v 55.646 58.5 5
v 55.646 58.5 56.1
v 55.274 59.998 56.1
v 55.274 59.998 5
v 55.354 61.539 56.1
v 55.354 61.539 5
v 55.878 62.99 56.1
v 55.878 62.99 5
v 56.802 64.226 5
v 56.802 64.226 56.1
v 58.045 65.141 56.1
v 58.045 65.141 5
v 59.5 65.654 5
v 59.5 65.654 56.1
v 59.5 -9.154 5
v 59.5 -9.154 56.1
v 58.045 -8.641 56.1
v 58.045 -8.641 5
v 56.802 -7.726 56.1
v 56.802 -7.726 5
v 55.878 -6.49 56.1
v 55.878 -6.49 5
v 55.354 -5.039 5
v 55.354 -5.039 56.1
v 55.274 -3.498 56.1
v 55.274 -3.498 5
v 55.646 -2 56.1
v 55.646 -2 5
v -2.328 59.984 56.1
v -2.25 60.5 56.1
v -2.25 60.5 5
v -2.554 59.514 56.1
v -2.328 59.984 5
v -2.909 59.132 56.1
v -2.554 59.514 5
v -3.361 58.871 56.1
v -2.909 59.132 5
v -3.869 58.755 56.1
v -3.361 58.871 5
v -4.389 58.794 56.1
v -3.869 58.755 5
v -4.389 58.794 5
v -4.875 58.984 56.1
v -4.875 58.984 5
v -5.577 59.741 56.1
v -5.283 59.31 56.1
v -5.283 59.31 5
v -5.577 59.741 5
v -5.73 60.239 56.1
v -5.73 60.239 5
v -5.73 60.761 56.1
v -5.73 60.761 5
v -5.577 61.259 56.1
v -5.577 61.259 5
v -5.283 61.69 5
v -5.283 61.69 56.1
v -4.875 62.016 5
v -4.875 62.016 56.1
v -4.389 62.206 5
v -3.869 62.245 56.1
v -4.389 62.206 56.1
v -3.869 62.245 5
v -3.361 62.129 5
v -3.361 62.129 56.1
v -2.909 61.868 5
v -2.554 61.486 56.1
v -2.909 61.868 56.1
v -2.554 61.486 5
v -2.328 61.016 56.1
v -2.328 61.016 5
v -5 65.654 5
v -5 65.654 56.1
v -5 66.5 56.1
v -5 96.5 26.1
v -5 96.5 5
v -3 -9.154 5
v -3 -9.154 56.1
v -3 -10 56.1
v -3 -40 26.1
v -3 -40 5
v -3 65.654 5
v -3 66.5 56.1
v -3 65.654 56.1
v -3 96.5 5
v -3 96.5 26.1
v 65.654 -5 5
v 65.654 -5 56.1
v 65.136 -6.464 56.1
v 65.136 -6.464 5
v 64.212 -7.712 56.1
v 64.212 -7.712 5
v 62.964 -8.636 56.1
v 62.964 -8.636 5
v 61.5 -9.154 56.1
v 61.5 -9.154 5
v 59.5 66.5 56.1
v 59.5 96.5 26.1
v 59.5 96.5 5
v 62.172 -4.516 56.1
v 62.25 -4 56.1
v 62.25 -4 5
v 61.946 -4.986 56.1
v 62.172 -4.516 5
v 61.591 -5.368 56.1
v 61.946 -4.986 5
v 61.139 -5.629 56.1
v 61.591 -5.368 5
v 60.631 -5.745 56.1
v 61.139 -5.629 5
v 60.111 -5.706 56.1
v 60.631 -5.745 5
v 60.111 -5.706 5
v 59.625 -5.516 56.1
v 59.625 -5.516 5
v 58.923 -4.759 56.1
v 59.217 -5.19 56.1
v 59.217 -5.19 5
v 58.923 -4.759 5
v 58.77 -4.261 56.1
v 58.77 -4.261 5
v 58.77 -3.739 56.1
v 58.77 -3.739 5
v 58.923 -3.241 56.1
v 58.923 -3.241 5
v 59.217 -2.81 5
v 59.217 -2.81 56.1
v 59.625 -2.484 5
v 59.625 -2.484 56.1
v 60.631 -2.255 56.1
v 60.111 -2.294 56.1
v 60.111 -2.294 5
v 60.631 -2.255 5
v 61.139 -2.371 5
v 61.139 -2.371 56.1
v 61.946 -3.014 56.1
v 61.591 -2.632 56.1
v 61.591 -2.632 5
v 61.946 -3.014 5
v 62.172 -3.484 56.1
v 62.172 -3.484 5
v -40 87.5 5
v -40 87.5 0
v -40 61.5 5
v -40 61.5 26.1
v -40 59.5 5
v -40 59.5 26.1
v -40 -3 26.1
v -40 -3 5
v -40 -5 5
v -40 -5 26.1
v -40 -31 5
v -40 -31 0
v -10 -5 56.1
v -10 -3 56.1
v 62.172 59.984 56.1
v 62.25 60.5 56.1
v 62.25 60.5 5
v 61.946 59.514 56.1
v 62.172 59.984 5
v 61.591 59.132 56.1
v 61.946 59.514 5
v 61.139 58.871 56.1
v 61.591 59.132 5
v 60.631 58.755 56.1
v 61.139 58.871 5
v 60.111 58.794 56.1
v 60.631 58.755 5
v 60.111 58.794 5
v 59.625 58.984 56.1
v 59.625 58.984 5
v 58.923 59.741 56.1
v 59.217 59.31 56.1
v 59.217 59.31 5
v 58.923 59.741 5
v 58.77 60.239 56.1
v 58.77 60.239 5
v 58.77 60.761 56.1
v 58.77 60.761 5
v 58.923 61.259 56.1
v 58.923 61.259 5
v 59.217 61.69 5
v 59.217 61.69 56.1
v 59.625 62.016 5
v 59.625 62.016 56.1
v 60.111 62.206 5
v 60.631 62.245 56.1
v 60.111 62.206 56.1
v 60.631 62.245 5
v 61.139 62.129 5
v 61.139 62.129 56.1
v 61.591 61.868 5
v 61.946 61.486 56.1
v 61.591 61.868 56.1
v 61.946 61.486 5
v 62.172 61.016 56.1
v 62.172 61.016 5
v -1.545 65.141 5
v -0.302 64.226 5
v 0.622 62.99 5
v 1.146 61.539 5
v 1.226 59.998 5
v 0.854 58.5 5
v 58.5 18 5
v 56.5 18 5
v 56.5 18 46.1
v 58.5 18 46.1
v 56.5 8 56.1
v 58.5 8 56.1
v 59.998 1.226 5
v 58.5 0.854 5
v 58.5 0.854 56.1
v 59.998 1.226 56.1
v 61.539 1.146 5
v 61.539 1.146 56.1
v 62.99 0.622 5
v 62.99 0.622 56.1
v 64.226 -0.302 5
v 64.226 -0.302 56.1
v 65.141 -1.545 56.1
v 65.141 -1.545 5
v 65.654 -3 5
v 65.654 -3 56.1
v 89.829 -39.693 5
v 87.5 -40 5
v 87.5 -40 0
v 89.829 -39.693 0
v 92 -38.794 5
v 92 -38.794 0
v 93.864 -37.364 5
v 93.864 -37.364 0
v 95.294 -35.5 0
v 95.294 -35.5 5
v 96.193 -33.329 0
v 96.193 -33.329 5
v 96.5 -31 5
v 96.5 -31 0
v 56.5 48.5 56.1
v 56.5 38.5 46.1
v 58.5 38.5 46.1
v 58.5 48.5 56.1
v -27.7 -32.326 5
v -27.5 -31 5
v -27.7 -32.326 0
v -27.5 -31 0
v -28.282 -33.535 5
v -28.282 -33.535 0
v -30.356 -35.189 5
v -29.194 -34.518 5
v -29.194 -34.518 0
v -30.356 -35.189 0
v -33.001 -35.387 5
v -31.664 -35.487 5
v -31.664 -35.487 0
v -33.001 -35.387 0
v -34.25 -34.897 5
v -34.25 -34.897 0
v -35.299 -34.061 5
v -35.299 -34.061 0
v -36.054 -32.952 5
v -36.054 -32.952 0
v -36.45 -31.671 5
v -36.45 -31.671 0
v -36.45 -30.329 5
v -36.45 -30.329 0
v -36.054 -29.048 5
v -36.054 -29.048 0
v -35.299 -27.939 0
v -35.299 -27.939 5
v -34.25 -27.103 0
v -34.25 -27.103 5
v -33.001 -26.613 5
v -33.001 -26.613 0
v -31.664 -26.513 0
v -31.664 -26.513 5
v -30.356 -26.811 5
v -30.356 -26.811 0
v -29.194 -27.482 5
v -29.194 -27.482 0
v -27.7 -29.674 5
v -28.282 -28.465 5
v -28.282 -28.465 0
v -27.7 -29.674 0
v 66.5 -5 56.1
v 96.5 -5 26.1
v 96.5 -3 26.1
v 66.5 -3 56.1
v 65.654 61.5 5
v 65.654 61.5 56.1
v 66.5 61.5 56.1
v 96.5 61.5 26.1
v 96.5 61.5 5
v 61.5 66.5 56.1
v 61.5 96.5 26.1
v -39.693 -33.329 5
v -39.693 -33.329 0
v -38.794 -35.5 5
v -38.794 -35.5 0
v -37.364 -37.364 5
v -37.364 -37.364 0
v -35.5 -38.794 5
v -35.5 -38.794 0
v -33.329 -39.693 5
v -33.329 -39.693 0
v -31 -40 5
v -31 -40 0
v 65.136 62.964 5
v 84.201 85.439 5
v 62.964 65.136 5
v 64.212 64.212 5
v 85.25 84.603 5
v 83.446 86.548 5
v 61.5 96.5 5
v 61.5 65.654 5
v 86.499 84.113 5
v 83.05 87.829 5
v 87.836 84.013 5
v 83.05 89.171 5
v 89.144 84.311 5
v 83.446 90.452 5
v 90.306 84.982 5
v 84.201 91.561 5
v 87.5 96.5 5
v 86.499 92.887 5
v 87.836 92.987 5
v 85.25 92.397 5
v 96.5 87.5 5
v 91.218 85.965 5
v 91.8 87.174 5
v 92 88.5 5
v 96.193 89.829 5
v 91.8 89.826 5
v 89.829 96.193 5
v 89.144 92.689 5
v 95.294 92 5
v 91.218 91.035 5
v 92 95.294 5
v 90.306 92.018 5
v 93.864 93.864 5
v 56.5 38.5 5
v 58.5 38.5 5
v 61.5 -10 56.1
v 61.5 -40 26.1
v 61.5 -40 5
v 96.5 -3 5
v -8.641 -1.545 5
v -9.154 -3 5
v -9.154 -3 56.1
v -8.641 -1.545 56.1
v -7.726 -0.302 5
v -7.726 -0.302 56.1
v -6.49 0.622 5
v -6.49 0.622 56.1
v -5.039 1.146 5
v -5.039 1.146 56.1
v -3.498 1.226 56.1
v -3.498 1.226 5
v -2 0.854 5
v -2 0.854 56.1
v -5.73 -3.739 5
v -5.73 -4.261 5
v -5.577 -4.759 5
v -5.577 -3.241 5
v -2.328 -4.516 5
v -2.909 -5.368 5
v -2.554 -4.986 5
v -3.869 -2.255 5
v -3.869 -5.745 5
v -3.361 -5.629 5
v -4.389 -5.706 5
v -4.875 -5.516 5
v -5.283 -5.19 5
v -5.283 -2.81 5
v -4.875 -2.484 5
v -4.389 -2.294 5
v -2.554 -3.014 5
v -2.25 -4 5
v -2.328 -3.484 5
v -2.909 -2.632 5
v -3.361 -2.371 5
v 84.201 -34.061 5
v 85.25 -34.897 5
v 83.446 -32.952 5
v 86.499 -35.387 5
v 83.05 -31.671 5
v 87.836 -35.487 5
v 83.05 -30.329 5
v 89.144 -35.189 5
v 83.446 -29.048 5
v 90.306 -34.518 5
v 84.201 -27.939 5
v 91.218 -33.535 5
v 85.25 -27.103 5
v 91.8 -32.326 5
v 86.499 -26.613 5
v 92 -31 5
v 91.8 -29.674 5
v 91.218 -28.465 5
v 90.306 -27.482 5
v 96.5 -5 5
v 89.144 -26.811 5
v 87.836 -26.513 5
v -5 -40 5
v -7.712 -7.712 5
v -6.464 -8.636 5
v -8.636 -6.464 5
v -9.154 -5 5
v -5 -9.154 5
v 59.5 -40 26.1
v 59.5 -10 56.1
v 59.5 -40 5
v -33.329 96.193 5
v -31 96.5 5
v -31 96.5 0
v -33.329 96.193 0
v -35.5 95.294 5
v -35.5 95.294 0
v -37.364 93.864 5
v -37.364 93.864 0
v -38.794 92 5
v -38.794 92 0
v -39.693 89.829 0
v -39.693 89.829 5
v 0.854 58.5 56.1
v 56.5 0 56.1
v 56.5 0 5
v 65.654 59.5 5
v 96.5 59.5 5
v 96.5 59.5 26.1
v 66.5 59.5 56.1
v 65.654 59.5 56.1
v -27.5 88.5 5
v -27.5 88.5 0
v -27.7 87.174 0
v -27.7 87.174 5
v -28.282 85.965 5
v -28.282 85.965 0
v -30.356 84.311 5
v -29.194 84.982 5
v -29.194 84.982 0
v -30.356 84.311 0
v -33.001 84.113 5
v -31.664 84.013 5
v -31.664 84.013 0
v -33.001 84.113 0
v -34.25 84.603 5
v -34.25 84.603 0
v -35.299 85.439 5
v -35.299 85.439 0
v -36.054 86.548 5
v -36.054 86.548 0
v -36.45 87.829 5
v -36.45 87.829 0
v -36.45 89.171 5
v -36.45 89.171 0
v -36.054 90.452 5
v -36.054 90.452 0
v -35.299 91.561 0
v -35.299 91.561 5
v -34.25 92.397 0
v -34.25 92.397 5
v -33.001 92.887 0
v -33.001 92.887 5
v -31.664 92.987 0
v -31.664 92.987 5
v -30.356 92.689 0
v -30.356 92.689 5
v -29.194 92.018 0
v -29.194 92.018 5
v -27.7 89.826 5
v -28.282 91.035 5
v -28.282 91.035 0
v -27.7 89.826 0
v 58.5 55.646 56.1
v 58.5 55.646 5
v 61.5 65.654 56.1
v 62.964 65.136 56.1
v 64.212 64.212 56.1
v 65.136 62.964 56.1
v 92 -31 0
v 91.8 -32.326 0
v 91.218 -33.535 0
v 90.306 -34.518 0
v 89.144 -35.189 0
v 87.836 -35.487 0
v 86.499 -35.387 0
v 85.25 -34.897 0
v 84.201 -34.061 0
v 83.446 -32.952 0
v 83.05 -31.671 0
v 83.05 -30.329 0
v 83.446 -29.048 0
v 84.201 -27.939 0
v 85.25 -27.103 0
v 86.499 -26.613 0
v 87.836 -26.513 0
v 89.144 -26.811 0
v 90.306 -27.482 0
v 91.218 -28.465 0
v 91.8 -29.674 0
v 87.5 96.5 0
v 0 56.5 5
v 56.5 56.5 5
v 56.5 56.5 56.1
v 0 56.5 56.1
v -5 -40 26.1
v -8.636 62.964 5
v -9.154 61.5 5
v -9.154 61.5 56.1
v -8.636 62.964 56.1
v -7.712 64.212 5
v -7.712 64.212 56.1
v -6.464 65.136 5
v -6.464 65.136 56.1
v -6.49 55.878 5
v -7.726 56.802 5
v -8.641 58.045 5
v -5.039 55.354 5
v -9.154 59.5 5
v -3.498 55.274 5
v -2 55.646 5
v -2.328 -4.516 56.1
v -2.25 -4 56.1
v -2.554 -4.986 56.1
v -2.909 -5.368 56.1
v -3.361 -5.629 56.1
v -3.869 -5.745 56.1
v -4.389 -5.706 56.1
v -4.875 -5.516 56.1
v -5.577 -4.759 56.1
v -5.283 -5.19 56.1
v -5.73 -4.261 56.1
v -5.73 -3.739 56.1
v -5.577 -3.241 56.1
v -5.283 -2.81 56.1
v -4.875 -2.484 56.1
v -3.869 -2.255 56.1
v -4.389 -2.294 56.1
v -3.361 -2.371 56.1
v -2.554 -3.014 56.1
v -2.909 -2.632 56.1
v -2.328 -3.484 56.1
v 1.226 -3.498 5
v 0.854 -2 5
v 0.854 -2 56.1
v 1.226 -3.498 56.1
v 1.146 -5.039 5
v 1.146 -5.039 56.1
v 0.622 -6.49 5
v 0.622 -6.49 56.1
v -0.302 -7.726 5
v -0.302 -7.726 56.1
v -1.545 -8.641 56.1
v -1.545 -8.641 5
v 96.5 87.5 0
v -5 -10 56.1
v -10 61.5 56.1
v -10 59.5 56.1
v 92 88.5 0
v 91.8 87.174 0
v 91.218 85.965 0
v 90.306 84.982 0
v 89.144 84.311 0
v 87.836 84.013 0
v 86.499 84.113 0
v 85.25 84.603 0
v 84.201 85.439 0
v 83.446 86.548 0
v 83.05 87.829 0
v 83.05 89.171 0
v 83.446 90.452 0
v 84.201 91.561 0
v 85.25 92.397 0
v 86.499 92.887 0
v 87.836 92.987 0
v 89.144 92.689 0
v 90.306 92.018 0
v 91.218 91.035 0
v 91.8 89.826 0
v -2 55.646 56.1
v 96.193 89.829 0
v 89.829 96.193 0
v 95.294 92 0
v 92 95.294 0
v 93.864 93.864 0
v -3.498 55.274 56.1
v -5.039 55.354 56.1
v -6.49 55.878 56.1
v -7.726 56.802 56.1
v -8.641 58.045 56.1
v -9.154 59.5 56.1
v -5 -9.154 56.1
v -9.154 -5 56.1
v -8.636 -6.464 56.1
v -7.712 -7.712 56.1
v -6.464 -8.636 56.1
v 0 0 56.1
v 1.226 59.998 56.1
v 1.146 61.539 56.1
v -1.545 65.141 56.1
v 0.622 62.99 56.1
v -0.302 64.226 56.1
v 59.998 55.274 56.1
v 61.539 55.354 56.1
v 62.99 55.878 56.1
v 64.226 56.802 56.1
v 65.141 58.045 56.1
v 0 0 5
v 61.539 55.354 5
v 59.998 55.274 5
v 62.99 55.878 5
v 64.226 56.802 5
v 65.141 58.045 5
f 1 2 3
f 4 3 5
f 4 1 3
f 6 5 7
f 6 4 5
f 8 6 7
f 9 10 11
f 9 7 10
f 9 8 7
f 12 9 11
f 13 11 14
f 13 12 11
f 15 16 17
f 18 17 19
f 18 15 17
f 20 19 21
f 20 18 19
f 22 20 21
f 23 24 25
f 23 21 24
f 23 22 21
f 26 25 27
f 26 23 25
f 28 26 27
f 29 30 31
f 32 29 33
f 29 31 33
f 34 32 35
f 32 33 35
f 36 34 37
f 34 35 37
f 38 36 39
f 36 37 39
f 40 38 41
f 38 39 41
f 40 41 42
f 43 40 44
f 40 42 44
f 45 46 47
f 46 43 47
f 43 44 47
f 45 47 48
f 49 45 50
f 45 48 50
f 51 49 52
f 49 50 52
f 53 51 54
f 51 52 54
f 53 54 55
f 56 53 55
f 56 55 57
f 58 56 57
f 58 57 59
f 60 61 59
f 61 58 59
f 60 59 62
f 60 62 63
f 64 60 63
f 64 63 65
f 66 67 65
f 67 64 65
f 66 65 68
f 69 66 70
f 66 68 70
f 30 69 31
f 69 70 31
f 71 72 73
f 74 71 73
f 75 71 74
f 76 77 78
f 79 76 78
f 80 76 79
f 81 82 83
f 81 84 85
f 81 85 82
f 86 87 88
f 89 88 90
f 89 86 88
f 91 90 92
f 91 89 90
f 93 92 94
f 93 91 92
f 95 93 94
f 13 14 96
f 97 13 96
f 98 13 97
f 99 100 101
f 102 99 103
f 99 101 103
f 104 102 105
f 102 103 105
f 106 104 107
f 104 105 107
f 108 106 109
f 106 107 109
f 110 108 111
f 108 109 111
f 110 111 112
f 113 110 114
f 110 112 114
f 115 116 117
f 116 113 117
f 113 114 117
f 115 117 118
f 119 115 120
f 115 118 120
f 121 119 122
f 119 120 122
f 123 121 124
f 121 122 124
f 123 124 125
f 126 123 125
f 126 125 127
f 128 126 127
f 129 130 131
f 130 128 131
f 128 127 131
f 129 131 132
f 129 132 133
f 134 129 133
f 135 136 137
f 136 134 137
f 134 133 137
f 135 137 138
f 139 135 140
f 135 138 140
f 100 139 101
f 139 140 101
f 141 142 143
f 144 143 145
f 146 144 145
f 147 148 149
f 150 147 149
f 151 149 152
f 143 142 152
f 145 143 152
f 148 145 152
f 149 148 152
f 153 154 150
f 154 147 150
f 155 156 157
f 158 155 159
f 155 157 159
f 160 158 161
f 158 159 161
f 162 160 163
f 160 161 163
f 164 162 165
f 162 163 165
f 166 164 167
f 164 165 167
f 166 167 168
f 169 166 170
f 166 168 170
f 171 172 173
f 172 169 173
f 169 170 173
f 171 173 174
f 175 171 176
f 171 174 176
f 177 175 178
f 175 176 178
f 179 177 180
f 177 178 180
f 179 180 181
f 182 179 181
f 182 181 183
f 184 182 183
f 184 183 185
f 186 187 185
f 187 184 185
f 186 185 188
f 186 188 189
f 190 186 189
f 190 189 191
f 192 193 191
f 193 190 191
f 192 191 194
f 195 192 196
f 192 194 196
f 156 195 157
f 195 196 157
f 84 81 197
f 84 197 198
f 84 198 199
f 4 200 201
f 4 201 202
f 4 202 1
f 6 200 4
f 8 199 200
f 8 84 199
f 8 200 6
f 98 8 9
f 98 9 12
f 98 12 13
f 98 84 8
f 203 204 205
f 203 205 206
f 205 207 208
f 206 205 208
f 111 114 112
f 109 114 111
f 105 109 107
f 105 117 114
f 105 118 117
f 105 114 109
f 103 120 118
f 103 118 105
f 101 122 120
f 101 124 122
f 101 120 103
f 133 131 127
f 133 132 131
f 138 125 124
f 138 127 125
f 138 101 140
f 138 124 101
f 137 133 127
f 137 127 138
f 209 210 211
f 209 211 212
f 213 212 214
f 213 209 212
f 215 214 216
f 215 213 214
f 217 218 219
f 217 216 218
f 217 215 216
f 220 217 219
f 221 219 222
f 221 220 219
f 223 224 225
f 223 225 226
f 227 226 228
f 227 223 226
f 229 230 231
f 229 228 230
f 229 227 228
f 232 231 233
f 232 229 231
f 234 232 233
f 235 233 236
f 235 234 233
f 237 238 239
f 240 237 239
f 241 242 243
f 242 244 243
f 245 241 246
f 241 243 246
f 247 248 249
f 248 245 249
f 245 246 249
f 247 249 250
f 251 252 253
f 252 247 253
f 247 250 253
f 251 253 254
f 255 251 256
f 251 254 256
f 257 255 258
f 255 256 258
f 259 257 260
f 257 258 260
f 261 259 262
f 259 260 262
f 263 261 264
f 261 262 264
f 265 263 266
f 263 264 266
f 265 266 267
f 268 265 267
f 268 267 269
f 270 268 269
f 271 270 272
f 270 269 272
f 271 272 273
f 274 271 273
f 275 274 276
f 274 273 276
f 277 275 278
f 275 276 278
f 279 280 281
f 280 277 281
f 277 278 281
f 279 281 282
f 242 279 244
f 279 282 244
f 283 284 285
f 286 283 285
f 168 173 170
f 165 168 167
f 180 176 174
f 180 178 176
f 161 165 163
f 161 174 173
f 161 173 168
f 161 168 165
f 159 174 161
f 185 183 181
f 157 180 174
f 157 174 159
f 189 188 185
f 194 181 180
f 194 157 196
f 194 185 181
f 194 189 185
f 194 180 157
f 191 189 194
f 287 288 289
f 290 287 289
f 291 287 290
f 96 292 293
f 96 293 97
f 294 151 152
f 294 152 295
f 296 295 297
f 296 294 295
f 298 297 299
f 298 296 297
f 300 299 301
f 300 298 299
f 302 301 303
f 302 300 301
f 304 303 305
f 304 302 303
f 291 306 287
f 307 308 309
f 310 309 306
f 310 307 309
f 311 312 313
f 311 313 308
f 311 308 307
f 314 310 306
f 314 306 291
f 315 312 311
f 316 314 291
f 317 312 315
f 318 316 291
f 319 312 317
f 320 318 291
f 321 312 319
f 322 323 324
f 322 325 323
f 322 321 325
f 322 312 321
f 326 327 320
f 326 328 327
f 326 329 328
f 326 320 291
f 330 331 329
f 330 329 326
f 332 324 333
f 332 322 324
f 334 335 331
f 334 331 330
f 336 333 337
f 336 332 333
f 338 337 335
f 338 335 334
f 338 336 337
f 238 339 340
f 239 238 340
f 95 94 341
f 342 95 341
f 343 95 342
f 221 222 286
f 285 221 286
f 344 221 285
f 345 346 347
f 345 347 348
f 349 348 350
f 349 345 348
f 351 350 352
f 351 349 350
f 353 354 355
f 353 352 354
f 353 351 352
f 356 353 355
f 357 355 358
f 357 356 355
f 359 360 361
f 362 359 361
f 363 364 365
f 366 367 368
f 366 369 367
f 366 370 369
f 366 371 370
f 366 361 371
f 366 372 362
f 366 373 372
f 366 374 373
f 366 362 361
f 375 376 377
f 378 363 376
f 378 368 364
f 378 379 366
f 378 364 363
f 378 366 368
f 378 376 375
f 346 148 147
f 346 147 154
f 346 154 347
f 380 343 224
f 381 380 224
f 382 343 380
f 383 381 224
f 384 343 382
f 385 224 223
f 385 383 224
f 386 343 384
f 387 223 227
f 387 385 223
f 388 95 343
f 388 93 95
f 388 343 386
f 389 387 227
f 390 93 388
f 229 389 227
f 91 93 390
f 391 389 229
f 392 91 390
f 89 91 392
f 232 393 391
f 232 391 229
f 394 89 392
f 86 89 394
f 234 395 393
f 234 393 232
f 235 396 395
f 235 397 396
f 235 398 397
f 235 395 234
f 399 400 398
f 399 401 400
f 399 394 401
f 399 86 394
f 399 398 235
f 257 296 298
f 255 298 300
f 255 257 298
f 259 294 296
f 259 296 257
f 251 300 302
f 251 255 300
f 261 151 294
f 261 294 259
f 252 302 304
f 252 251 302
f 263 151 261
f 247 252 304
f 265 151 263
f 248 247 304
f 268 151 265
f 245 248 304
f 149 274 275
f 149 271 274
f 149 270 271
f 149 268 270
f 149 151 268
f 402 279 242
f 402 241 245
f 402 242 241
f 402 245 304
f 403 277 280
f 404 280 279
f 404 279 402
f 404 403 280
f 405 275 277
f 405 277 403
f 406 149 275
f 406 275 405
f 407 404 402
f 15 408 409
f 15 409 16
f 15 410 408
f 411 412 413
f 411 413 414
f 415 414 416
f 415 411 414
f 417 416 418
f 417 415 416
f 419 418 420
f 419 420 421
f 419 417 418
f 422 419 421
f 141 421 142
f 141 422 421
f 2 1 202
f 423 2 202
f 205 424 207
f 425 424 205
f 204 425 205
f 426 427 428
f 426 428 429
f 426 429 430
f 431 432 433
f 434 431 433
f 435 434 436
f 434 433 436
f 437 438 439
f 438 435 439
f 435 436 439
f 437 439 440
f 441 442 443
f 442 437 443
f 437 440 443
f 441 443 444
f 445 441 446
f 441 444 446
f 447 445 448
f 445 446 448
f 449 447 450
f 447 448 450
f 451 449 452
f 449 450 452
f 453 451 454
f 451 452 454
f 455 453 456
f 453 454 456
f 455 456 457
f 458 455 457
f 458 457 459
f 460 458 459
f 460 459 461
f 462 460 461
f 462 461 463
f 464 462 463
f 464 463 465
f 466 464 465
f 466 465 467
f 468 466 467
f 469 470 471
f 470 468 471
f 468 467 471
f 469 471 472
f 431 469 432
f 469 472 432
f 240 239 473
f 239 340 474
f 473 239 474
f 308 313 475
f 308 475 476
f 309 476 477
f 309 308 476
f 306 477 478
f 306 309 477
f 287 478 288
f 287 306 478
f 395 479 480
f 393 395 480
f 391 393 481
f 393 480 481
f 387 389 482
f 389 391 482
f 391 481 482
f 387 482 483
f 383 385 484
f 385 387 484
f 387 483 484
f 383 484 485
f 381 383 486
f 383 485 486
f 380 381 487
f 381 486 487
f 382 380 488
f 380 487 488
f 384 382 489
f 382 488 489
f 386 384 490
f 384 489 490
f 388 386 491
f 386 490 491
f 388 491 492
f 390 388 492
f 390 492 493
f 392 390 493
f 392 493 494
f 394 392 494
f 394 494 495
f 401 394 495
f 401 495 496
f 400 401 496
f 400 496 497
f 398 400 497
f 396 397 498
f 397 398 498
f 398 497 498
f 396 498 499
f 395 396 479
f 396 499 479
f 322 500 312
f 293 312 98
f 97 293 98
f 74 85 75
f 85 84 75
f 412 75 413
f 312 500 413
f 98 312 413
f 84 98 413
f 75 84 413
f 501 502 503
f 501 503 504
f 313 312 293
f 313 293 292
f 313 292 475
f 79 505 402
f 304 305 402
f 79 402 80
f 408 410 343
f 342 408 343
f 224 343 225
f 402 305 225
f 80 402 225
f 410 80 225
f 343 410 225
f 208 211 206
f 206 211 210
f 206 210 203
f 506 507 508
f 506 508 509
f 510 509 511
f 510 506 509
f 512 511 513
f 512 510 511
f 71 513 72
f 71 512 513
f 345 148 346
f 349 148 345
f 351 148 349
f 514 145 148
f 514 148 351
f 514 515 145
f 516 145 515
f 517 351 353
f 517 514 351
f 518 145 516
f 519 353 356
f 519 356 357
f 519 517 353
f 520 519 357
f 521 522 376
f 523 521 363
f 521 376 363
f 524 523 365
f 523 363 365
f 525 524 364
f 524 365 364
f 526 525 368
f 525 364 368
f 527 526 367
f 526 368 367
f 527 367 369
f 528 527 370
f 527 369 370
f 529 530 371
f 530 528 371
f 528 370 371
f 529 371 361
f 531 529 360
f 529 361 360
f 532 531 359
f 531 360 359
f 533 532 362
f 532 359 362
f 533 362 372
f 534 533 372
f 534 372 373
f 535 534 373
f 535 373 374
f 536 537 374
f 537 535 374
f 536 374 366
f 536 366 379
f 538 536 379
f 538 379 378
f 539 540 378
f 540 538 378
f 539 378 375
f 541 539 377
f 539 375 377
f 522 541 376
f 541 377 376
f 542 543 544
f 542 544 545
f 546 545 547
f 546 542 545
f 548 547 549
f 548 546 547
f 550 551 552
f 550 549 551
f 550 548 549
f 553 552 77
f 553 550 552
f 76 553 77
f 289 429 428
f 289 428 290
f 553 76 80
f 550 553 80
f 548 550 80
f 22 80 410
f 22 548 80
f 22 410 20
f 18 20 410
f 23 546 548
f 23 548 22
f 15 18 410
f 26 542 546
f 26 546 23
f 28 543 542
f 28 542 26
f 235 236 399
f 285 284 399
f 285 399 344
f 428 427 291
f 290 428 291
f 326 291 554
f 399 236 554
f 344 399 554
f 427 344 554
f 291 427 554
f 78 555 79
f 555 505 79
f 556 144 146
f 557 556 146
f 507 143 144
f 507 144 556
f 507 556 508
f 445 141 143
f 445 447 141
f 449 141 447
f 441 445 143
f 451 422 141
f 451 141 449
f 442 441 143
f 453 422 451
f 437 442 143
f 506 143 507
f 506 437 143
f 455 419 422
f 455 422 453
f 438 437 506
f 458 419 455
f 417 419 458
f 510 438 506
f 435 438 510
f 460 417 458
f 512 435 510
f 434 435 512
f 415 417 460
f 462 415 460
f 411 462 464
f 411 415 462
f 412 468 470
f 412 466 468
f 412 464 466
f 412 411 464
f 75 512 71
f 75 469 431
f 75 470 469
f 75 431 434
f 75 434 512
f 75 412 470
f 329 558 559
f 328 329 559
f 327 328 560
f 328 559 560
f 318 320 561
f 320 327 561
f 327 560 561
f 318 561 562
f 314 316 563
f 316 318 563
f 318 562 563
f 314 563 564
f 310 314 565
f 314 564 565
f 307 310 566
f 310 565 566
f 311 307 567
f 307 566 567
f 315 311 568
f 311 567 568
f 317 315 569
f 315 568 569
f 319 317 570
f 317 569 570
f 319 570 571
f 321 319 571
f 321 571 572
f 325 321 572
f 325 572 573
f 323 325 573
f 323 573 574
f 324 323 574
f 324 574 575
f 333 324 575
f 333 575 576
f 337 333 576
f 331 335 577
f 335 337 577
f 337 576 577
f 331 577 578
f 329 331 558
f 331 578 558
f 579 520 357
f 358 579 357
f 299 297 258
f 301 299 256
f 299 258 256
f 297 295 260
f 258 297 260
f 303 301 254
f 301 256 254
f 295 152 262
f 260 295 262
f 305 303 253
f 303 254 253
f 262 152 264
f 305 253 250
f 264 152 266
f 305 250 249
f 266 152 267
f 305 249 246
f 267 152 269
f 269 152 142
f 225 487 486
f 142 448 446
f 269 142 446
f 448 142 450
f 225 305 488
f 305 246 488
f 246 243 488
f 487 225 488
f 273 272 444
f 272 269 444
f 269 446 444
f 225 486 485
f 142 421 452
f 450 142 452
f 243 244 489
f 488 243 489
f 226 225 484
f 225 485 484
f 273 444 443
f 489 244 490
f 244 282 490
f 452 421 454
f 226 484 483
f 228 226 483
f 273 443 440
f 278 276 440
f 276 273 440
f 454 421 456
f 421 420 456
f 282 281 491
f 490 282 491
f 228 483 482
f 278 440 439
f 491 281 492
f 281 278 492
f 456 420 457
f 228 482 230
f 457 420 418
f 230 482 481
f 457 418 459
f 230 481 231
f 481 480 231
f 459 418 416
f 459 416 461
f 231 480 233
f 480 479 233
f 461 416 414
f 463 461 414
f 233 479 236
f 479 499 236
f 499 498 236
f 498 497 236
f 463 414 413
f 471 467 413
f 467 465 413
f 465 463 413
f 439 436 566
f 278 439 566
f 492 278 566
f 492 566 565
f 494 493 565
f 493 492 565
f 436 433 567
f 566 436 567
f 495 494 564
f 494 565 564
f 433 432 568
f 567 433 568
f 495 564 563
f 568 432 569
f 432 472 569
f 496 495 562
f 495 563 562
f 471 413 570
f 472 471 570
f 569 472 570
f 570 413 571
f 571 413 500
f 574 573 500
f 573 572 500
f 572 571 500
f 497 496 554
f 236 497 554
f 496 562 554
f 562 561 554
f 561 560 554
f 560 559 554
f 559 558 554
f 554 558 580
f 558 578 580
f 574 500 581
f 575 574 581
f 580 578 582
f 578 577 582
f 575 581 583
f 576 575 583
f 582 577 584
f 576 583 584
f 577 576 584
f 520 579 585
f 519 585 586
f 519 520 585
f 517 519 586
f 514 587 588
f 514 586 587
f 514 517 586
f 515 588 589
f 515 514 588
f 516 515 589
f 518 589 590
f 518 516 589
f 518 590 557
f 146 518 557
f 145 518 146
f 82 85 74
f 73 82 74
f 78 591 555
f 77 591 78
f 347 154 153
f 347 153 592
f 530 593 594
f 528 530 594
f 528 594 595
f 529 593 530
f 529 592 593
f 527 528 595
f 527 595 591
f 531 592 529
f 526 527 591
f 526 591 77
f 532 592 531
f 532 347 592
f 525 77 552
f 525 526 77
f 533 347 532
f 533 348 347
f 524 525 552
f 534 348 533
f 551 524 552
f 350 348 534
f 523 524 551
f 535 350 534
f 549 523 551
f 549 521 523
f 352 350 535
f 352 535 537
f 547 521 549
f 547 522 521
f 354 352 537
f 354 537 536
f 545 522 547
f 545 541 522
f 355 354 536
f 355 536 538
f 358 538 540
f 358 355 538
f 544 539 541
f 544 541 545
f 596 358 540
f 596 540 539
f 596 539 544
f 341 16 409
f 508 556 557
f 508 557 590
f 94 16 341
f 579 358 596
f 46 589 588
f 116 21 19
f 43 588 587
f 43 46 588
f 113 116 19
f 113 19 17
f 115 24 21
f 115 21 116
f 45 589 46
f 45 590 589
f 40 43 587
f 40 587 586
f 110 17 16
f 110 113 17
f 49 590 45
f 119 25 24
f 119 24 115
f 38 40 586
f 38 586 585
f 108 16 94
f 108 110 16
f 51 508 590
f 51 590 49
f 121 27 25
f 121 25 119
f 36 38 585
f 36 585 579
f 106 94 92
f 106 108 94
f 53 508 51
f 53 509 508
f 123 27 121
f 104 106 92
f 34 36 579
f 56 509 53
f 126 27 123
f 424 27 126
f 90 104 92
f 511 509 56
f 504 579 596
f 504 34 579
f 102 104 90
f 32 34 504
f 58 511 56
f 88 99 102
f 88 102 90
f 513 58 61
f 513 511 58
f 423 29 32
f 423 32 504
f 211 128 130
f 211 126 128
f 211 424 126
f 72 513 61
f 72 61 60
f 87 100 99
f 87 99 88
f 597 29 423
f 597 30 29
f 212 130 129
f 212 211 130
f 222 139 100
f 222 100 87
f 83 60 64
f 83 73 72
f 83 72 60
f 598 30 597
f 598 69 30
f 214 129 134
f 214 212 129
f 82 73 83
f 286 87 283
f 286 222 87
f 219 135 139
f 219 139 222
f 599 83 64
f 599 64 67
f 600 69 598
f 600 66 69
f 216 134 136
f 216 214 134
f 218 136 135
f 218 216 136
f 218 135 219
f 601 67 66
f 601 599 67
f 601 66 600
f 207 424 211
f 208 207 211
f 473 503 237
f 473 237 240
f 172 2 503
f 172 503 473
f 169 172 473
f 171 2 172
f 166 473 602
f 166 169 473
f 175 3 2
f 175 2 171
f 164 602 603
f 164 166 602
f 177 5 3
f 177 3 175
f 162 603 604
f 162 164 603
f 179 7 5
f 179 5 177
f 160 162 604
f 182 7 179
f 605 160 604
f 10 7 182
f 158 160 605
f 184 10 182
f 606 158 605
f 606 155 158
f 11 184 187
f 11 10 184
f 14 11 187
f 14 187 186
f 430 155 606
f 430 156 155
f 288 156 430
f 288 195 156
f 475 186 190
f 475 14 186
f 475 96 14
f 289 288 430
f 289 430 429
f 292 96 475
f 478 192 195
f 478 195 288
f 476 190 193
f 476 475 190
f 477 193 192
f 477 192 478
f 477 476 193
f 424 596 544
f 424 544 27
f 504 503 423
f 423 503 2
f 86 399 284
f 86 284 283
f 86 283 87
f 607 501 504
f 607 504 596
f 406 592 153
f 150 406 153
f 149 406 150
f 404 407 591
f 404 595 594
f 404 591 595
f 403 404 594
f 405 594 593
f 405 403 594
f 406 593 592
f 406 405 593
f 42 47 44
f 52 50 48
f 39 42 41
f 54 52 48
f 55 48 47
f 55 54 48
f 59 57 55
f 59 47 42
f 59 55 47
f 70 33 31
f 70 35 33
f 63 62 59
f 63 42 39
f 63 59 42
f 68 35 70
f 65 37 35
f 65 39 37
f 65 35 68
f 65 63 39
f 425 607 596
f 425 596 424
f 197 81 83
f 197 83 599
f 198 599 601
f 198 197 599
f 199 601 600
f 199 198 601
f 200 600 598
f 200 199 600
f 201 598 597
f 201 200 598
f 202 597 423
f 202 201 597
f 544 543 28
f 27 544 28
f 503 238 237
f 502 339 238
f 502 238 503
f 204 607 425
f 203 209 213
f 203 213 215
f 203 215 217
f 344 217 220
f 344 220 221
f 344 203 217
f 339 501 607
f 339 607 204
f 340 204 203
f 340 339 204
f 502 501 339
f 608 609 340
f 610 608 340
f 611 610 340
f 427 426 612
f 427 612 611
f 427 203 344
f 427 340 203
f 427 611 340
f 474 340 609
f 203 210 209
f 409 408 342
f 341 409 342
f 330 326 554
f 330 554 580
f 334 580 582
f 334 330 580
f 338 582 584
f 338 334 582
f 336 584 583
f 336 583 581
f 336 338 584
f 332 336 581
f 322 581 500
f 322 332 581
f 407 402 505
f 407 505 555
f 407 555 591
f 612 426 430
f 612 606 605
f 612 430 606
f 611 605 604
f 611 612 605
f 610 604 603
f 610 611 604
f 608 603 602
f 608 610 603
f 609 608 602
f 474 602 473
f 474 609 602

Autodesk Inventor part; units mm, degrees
ref_plane "YZ Plane" through (0, 0, 0) normal (1, 0, 0) x (0, 1, 0)
ref_plane "XZ Plane" through (0, 0, 0) normal (0, 1, 0) x (-1, 0, 0)
ref_plane "XY Plane" through (0, 0, 0) normal (0, 0, 1) x (1, 0, 0)
sketch "BasePlate" plane through (0, 0, 0) normal (0, 0, 1) x (1, 0, 0)
  line L0 (56.5, 56.5) -> (0, 56.5)
  line L1 (0, 56.5) -> (0, 0)
  line L2 (0, 0) -> (56.5, 0)
  line L3 (56.5, 0) -> (56.5, 56.5)
  line L4 (96.5, 96.5) -> (-40, 96.5)
  line L5 (-40, 96.5) -> (-40, -40)
  line L6 (-40, -40) -> (96.5, -40)
  line L7 (96.5, -40) -> (96.5, 96.5)
  circle A0 centre (-4, 60.5) radius 1.75
  circle A1 centre (-4, 60.5) radius 5.25
  circle A2 centre (60.5, 60.5) radius 5.25
  circle A3 centre (60.5, 60.5) radius 1.75
  circle A4 centre (-4, -4) radius 5.25
  circle A5 centre (-4, -4) radius 1.75
  circle A6 centre (60.5, -4) radius 5.25
  circle A7 centre (60.5, -4) radius 1.75
  line L8 (58.5, 58.5) -> (-2, 58.5)
  line L9 (-2, 58.5) -> (-2, -2)
  line L10 (-2, -2) -> (58.5, -2)
  line L11 (58.5, -2) -> (58.5, 58.5)
  line L12 (56.5, 38.5) -> (58.5, 38.5)
  line L13 (56.5, 18) -> (58.5, 18)
  circle A8 centre (-32, 88.5) radius 4.5
  circle A9 centre (87.5, 88.5) radius 4.5
  circle A10 centre (-32, -31) radius 4.5
  circle A11 centre (87.5, -31) radius 4.5
  line L14 (-40, 61.5) -> (-9.1539, 61.5)
  line L15 (-9.1539, 61.5) -> (-9.1539, 59.5)
  line L16 (-9.1539, 59.5) -> (-40, 59.5)
  line L17 (-40, 59.5) -> (-40, 61.5)
  line L18 (-3, 96.5) -> (-3, 65.6539)
  line L19 (-5, 65.6539) -> (-5, 96.5)
  line L20 (-5, 96.5) -> (-3, 96.5)
  line L21 (-3, 65.6539) -> (-5, 65.6539)
  line L22 (0, 56.5) -> (56.5, 0)
  line L23 (56.5, 56.5) -> (0, 0)
  line L24 (-9.1539, -3) -> (-9.1539, -5)
  line L25 (-40, -5) -> (-40, -3)
  line L26 (-9.1539, -5) -> (-40, -5)
  line L27 (-40, -3) -> (-9.1539, -3)
  line L28 (-3, -9.1539) -> (-3, -40)
  line L29 (-5, -40) -> (-5, -9.1539)
  line L30 (-3, -40) -> (-5, -40)
  line L31 (-5, -9.1539) -> (-3, -9.1539)
  line L32 (59.5, -9.1539) -> (61.5, -9.1539)
  line L33 (61.5, -40) -> (59.5, -40)
  line L34 (61.5, -9.1539) -> (61.5, -40)
  line L35 (59.5, -40) -> (59.5, -9.1539)
  line L36 (65.6539, -3) -> (96.5, -3)
  line L37 (96.5, -5) -> (65.6539, -5)
  line L38 (96.5, -3) -> (96.5, -5)
  line L39 (65.6539, -5) -> (65.6539, -3)
  line L40 (65.6539, 59.5) -> (65.6539, 61.5)
  line L41 (96.5, 61.5) -> (96.5, 59.5)
  line L42 (65.6539, 61.5) -> (96.5, 61.5)
  line L43 (96.5, 59.5) -> (65.6539, 59.5)
  line L44 (59.5, 65.6539) -> (59.5, 96.5)
  line L45 (61.5, 96.5) -> (61.5, 65.6539)
  line L46 (59.5, 96.5) -> (61.5, 96.5)
  line L47 (61.5, 65.6539) -> (59.5, 65.6539)
  point P0 (28.25, 28.25)
  dimension "d0" = 56.5
  dimension "d102" = 40
  dimension "d104" = 3.5
  dimension "d105" = 3.5
  dimension "d106" = 4
  dimension "d107" = 4
  dimension "d110" = 64.5
  dimension "d113" = 64.5
  dimension "d116" = 2
  dimension "d117" = 20
  dimension "d118" = 20
  dimension "d119" = 9
  dimension "d120" = 8
  dimension "d121" = 8
  dimension "d124" = 119.5
  dimension "d127" = 119.5
  dimension "d130" = 2
  dimension "d133" = 90
  dimension "d137" = 360
extrude "Extrusion8" add sketch "BasePlate" along normal blind 5 contours L23 L22 L0 | L0 L1 L2 L3 L13 L11 A6 L10 A4 L9 A1 L8 A2 L12 | L3 L22 L23 | L22 L23 L1 | L12 L11 L13 L3 | L22 L2 L23 | L11 A2 L43 L7 L36 A6 | L11 L8 A2 L47 L40 | A2 L8 L11 | L11 L10 A6 | A6 L39 L32 L10 L11 | L8 A1 L18 L4 L44 A2 | L40 A2 | A2 L42 L7 L43 | L36 L7 L37 A6 | A6 L39 | A6 L35 L6 L28 A4 L10 | L44 L4 L45 A2 | A2 L47 | L8 L9 A1 L15 L21 | A1 L9 L8 | A2 L45 L4 L7 L42 | L37 L7 L6 L34 A6 | L32 A6 | A6 L34 L6 L35 | L10 L9 A4 | A4 L31 L24 L9 L10 | L9 A4 L27 L5 L16 A1 | L18 A1 L19 L4 | L16 L5 L14 A1 | A1 L15 | L21 A1 | L6 L29 A4 L28 | A4 L31 | L24 A4 | A4 L26 L5 L27 | L19 A1 L14 L5 L4 | L6 L5 L26 A4 L29 | A0 | A3 | A5 | A7
extrude "Extrusion9" add sketch "BasePlate" along normal blind 56.1 contours L0 L1 L2 L3 L13 L11 A6 L10 A4 L9 A1 L8 A2 L12 | L11 L8 A2 L47 L40 | A2 L8 L11 | L11 L10 A6 | A6 L39 L32 L10 L11 | L40 A2 | A2 L42 L7 L43 | L36 L7 L37 A6 | A6 L39 | L44 L4 L45 A2 | A2 L47 | L8 L9 A1 L15 L21 | A1 L9 L8 | L32 A6 | A6 L34 L6 L35 | L10 L9 A4 | A4 L31 L24 L9 L10 | L18 A1 L19 L4 | L16 L5 L14 A1 | A1 L15 | L21 A1 | L6 L29 A4 L28 | A4 L31 | L24 A4 | A4 L26 L5 L27
chamfer "Chamfer3" distance 10 angle 45 2 edges at (57.5, 18, 56.1) (57.5, 38.5, 56.1)
chamfer "Chamfer4" distance 30 angle 45 8 edges at (96.5, -4, 56.1) (60.5, -40, 56.1) (-4, -40, 56.1) (-40, -4, 56.1) (-40, 60.5, 56.1) (-4, 96.5, 56.1) (60.5, 96.5, 56.1) (96.5, 60.5, 56.1)
fillet "Fillet3" radius 9 4 edges at (96.5, -40, 2.5) (96.5, 96.5, 2.5) (-40, 96.5, 2.5) (-40, -40, 2.5)
properties part number "TurntableStand"
